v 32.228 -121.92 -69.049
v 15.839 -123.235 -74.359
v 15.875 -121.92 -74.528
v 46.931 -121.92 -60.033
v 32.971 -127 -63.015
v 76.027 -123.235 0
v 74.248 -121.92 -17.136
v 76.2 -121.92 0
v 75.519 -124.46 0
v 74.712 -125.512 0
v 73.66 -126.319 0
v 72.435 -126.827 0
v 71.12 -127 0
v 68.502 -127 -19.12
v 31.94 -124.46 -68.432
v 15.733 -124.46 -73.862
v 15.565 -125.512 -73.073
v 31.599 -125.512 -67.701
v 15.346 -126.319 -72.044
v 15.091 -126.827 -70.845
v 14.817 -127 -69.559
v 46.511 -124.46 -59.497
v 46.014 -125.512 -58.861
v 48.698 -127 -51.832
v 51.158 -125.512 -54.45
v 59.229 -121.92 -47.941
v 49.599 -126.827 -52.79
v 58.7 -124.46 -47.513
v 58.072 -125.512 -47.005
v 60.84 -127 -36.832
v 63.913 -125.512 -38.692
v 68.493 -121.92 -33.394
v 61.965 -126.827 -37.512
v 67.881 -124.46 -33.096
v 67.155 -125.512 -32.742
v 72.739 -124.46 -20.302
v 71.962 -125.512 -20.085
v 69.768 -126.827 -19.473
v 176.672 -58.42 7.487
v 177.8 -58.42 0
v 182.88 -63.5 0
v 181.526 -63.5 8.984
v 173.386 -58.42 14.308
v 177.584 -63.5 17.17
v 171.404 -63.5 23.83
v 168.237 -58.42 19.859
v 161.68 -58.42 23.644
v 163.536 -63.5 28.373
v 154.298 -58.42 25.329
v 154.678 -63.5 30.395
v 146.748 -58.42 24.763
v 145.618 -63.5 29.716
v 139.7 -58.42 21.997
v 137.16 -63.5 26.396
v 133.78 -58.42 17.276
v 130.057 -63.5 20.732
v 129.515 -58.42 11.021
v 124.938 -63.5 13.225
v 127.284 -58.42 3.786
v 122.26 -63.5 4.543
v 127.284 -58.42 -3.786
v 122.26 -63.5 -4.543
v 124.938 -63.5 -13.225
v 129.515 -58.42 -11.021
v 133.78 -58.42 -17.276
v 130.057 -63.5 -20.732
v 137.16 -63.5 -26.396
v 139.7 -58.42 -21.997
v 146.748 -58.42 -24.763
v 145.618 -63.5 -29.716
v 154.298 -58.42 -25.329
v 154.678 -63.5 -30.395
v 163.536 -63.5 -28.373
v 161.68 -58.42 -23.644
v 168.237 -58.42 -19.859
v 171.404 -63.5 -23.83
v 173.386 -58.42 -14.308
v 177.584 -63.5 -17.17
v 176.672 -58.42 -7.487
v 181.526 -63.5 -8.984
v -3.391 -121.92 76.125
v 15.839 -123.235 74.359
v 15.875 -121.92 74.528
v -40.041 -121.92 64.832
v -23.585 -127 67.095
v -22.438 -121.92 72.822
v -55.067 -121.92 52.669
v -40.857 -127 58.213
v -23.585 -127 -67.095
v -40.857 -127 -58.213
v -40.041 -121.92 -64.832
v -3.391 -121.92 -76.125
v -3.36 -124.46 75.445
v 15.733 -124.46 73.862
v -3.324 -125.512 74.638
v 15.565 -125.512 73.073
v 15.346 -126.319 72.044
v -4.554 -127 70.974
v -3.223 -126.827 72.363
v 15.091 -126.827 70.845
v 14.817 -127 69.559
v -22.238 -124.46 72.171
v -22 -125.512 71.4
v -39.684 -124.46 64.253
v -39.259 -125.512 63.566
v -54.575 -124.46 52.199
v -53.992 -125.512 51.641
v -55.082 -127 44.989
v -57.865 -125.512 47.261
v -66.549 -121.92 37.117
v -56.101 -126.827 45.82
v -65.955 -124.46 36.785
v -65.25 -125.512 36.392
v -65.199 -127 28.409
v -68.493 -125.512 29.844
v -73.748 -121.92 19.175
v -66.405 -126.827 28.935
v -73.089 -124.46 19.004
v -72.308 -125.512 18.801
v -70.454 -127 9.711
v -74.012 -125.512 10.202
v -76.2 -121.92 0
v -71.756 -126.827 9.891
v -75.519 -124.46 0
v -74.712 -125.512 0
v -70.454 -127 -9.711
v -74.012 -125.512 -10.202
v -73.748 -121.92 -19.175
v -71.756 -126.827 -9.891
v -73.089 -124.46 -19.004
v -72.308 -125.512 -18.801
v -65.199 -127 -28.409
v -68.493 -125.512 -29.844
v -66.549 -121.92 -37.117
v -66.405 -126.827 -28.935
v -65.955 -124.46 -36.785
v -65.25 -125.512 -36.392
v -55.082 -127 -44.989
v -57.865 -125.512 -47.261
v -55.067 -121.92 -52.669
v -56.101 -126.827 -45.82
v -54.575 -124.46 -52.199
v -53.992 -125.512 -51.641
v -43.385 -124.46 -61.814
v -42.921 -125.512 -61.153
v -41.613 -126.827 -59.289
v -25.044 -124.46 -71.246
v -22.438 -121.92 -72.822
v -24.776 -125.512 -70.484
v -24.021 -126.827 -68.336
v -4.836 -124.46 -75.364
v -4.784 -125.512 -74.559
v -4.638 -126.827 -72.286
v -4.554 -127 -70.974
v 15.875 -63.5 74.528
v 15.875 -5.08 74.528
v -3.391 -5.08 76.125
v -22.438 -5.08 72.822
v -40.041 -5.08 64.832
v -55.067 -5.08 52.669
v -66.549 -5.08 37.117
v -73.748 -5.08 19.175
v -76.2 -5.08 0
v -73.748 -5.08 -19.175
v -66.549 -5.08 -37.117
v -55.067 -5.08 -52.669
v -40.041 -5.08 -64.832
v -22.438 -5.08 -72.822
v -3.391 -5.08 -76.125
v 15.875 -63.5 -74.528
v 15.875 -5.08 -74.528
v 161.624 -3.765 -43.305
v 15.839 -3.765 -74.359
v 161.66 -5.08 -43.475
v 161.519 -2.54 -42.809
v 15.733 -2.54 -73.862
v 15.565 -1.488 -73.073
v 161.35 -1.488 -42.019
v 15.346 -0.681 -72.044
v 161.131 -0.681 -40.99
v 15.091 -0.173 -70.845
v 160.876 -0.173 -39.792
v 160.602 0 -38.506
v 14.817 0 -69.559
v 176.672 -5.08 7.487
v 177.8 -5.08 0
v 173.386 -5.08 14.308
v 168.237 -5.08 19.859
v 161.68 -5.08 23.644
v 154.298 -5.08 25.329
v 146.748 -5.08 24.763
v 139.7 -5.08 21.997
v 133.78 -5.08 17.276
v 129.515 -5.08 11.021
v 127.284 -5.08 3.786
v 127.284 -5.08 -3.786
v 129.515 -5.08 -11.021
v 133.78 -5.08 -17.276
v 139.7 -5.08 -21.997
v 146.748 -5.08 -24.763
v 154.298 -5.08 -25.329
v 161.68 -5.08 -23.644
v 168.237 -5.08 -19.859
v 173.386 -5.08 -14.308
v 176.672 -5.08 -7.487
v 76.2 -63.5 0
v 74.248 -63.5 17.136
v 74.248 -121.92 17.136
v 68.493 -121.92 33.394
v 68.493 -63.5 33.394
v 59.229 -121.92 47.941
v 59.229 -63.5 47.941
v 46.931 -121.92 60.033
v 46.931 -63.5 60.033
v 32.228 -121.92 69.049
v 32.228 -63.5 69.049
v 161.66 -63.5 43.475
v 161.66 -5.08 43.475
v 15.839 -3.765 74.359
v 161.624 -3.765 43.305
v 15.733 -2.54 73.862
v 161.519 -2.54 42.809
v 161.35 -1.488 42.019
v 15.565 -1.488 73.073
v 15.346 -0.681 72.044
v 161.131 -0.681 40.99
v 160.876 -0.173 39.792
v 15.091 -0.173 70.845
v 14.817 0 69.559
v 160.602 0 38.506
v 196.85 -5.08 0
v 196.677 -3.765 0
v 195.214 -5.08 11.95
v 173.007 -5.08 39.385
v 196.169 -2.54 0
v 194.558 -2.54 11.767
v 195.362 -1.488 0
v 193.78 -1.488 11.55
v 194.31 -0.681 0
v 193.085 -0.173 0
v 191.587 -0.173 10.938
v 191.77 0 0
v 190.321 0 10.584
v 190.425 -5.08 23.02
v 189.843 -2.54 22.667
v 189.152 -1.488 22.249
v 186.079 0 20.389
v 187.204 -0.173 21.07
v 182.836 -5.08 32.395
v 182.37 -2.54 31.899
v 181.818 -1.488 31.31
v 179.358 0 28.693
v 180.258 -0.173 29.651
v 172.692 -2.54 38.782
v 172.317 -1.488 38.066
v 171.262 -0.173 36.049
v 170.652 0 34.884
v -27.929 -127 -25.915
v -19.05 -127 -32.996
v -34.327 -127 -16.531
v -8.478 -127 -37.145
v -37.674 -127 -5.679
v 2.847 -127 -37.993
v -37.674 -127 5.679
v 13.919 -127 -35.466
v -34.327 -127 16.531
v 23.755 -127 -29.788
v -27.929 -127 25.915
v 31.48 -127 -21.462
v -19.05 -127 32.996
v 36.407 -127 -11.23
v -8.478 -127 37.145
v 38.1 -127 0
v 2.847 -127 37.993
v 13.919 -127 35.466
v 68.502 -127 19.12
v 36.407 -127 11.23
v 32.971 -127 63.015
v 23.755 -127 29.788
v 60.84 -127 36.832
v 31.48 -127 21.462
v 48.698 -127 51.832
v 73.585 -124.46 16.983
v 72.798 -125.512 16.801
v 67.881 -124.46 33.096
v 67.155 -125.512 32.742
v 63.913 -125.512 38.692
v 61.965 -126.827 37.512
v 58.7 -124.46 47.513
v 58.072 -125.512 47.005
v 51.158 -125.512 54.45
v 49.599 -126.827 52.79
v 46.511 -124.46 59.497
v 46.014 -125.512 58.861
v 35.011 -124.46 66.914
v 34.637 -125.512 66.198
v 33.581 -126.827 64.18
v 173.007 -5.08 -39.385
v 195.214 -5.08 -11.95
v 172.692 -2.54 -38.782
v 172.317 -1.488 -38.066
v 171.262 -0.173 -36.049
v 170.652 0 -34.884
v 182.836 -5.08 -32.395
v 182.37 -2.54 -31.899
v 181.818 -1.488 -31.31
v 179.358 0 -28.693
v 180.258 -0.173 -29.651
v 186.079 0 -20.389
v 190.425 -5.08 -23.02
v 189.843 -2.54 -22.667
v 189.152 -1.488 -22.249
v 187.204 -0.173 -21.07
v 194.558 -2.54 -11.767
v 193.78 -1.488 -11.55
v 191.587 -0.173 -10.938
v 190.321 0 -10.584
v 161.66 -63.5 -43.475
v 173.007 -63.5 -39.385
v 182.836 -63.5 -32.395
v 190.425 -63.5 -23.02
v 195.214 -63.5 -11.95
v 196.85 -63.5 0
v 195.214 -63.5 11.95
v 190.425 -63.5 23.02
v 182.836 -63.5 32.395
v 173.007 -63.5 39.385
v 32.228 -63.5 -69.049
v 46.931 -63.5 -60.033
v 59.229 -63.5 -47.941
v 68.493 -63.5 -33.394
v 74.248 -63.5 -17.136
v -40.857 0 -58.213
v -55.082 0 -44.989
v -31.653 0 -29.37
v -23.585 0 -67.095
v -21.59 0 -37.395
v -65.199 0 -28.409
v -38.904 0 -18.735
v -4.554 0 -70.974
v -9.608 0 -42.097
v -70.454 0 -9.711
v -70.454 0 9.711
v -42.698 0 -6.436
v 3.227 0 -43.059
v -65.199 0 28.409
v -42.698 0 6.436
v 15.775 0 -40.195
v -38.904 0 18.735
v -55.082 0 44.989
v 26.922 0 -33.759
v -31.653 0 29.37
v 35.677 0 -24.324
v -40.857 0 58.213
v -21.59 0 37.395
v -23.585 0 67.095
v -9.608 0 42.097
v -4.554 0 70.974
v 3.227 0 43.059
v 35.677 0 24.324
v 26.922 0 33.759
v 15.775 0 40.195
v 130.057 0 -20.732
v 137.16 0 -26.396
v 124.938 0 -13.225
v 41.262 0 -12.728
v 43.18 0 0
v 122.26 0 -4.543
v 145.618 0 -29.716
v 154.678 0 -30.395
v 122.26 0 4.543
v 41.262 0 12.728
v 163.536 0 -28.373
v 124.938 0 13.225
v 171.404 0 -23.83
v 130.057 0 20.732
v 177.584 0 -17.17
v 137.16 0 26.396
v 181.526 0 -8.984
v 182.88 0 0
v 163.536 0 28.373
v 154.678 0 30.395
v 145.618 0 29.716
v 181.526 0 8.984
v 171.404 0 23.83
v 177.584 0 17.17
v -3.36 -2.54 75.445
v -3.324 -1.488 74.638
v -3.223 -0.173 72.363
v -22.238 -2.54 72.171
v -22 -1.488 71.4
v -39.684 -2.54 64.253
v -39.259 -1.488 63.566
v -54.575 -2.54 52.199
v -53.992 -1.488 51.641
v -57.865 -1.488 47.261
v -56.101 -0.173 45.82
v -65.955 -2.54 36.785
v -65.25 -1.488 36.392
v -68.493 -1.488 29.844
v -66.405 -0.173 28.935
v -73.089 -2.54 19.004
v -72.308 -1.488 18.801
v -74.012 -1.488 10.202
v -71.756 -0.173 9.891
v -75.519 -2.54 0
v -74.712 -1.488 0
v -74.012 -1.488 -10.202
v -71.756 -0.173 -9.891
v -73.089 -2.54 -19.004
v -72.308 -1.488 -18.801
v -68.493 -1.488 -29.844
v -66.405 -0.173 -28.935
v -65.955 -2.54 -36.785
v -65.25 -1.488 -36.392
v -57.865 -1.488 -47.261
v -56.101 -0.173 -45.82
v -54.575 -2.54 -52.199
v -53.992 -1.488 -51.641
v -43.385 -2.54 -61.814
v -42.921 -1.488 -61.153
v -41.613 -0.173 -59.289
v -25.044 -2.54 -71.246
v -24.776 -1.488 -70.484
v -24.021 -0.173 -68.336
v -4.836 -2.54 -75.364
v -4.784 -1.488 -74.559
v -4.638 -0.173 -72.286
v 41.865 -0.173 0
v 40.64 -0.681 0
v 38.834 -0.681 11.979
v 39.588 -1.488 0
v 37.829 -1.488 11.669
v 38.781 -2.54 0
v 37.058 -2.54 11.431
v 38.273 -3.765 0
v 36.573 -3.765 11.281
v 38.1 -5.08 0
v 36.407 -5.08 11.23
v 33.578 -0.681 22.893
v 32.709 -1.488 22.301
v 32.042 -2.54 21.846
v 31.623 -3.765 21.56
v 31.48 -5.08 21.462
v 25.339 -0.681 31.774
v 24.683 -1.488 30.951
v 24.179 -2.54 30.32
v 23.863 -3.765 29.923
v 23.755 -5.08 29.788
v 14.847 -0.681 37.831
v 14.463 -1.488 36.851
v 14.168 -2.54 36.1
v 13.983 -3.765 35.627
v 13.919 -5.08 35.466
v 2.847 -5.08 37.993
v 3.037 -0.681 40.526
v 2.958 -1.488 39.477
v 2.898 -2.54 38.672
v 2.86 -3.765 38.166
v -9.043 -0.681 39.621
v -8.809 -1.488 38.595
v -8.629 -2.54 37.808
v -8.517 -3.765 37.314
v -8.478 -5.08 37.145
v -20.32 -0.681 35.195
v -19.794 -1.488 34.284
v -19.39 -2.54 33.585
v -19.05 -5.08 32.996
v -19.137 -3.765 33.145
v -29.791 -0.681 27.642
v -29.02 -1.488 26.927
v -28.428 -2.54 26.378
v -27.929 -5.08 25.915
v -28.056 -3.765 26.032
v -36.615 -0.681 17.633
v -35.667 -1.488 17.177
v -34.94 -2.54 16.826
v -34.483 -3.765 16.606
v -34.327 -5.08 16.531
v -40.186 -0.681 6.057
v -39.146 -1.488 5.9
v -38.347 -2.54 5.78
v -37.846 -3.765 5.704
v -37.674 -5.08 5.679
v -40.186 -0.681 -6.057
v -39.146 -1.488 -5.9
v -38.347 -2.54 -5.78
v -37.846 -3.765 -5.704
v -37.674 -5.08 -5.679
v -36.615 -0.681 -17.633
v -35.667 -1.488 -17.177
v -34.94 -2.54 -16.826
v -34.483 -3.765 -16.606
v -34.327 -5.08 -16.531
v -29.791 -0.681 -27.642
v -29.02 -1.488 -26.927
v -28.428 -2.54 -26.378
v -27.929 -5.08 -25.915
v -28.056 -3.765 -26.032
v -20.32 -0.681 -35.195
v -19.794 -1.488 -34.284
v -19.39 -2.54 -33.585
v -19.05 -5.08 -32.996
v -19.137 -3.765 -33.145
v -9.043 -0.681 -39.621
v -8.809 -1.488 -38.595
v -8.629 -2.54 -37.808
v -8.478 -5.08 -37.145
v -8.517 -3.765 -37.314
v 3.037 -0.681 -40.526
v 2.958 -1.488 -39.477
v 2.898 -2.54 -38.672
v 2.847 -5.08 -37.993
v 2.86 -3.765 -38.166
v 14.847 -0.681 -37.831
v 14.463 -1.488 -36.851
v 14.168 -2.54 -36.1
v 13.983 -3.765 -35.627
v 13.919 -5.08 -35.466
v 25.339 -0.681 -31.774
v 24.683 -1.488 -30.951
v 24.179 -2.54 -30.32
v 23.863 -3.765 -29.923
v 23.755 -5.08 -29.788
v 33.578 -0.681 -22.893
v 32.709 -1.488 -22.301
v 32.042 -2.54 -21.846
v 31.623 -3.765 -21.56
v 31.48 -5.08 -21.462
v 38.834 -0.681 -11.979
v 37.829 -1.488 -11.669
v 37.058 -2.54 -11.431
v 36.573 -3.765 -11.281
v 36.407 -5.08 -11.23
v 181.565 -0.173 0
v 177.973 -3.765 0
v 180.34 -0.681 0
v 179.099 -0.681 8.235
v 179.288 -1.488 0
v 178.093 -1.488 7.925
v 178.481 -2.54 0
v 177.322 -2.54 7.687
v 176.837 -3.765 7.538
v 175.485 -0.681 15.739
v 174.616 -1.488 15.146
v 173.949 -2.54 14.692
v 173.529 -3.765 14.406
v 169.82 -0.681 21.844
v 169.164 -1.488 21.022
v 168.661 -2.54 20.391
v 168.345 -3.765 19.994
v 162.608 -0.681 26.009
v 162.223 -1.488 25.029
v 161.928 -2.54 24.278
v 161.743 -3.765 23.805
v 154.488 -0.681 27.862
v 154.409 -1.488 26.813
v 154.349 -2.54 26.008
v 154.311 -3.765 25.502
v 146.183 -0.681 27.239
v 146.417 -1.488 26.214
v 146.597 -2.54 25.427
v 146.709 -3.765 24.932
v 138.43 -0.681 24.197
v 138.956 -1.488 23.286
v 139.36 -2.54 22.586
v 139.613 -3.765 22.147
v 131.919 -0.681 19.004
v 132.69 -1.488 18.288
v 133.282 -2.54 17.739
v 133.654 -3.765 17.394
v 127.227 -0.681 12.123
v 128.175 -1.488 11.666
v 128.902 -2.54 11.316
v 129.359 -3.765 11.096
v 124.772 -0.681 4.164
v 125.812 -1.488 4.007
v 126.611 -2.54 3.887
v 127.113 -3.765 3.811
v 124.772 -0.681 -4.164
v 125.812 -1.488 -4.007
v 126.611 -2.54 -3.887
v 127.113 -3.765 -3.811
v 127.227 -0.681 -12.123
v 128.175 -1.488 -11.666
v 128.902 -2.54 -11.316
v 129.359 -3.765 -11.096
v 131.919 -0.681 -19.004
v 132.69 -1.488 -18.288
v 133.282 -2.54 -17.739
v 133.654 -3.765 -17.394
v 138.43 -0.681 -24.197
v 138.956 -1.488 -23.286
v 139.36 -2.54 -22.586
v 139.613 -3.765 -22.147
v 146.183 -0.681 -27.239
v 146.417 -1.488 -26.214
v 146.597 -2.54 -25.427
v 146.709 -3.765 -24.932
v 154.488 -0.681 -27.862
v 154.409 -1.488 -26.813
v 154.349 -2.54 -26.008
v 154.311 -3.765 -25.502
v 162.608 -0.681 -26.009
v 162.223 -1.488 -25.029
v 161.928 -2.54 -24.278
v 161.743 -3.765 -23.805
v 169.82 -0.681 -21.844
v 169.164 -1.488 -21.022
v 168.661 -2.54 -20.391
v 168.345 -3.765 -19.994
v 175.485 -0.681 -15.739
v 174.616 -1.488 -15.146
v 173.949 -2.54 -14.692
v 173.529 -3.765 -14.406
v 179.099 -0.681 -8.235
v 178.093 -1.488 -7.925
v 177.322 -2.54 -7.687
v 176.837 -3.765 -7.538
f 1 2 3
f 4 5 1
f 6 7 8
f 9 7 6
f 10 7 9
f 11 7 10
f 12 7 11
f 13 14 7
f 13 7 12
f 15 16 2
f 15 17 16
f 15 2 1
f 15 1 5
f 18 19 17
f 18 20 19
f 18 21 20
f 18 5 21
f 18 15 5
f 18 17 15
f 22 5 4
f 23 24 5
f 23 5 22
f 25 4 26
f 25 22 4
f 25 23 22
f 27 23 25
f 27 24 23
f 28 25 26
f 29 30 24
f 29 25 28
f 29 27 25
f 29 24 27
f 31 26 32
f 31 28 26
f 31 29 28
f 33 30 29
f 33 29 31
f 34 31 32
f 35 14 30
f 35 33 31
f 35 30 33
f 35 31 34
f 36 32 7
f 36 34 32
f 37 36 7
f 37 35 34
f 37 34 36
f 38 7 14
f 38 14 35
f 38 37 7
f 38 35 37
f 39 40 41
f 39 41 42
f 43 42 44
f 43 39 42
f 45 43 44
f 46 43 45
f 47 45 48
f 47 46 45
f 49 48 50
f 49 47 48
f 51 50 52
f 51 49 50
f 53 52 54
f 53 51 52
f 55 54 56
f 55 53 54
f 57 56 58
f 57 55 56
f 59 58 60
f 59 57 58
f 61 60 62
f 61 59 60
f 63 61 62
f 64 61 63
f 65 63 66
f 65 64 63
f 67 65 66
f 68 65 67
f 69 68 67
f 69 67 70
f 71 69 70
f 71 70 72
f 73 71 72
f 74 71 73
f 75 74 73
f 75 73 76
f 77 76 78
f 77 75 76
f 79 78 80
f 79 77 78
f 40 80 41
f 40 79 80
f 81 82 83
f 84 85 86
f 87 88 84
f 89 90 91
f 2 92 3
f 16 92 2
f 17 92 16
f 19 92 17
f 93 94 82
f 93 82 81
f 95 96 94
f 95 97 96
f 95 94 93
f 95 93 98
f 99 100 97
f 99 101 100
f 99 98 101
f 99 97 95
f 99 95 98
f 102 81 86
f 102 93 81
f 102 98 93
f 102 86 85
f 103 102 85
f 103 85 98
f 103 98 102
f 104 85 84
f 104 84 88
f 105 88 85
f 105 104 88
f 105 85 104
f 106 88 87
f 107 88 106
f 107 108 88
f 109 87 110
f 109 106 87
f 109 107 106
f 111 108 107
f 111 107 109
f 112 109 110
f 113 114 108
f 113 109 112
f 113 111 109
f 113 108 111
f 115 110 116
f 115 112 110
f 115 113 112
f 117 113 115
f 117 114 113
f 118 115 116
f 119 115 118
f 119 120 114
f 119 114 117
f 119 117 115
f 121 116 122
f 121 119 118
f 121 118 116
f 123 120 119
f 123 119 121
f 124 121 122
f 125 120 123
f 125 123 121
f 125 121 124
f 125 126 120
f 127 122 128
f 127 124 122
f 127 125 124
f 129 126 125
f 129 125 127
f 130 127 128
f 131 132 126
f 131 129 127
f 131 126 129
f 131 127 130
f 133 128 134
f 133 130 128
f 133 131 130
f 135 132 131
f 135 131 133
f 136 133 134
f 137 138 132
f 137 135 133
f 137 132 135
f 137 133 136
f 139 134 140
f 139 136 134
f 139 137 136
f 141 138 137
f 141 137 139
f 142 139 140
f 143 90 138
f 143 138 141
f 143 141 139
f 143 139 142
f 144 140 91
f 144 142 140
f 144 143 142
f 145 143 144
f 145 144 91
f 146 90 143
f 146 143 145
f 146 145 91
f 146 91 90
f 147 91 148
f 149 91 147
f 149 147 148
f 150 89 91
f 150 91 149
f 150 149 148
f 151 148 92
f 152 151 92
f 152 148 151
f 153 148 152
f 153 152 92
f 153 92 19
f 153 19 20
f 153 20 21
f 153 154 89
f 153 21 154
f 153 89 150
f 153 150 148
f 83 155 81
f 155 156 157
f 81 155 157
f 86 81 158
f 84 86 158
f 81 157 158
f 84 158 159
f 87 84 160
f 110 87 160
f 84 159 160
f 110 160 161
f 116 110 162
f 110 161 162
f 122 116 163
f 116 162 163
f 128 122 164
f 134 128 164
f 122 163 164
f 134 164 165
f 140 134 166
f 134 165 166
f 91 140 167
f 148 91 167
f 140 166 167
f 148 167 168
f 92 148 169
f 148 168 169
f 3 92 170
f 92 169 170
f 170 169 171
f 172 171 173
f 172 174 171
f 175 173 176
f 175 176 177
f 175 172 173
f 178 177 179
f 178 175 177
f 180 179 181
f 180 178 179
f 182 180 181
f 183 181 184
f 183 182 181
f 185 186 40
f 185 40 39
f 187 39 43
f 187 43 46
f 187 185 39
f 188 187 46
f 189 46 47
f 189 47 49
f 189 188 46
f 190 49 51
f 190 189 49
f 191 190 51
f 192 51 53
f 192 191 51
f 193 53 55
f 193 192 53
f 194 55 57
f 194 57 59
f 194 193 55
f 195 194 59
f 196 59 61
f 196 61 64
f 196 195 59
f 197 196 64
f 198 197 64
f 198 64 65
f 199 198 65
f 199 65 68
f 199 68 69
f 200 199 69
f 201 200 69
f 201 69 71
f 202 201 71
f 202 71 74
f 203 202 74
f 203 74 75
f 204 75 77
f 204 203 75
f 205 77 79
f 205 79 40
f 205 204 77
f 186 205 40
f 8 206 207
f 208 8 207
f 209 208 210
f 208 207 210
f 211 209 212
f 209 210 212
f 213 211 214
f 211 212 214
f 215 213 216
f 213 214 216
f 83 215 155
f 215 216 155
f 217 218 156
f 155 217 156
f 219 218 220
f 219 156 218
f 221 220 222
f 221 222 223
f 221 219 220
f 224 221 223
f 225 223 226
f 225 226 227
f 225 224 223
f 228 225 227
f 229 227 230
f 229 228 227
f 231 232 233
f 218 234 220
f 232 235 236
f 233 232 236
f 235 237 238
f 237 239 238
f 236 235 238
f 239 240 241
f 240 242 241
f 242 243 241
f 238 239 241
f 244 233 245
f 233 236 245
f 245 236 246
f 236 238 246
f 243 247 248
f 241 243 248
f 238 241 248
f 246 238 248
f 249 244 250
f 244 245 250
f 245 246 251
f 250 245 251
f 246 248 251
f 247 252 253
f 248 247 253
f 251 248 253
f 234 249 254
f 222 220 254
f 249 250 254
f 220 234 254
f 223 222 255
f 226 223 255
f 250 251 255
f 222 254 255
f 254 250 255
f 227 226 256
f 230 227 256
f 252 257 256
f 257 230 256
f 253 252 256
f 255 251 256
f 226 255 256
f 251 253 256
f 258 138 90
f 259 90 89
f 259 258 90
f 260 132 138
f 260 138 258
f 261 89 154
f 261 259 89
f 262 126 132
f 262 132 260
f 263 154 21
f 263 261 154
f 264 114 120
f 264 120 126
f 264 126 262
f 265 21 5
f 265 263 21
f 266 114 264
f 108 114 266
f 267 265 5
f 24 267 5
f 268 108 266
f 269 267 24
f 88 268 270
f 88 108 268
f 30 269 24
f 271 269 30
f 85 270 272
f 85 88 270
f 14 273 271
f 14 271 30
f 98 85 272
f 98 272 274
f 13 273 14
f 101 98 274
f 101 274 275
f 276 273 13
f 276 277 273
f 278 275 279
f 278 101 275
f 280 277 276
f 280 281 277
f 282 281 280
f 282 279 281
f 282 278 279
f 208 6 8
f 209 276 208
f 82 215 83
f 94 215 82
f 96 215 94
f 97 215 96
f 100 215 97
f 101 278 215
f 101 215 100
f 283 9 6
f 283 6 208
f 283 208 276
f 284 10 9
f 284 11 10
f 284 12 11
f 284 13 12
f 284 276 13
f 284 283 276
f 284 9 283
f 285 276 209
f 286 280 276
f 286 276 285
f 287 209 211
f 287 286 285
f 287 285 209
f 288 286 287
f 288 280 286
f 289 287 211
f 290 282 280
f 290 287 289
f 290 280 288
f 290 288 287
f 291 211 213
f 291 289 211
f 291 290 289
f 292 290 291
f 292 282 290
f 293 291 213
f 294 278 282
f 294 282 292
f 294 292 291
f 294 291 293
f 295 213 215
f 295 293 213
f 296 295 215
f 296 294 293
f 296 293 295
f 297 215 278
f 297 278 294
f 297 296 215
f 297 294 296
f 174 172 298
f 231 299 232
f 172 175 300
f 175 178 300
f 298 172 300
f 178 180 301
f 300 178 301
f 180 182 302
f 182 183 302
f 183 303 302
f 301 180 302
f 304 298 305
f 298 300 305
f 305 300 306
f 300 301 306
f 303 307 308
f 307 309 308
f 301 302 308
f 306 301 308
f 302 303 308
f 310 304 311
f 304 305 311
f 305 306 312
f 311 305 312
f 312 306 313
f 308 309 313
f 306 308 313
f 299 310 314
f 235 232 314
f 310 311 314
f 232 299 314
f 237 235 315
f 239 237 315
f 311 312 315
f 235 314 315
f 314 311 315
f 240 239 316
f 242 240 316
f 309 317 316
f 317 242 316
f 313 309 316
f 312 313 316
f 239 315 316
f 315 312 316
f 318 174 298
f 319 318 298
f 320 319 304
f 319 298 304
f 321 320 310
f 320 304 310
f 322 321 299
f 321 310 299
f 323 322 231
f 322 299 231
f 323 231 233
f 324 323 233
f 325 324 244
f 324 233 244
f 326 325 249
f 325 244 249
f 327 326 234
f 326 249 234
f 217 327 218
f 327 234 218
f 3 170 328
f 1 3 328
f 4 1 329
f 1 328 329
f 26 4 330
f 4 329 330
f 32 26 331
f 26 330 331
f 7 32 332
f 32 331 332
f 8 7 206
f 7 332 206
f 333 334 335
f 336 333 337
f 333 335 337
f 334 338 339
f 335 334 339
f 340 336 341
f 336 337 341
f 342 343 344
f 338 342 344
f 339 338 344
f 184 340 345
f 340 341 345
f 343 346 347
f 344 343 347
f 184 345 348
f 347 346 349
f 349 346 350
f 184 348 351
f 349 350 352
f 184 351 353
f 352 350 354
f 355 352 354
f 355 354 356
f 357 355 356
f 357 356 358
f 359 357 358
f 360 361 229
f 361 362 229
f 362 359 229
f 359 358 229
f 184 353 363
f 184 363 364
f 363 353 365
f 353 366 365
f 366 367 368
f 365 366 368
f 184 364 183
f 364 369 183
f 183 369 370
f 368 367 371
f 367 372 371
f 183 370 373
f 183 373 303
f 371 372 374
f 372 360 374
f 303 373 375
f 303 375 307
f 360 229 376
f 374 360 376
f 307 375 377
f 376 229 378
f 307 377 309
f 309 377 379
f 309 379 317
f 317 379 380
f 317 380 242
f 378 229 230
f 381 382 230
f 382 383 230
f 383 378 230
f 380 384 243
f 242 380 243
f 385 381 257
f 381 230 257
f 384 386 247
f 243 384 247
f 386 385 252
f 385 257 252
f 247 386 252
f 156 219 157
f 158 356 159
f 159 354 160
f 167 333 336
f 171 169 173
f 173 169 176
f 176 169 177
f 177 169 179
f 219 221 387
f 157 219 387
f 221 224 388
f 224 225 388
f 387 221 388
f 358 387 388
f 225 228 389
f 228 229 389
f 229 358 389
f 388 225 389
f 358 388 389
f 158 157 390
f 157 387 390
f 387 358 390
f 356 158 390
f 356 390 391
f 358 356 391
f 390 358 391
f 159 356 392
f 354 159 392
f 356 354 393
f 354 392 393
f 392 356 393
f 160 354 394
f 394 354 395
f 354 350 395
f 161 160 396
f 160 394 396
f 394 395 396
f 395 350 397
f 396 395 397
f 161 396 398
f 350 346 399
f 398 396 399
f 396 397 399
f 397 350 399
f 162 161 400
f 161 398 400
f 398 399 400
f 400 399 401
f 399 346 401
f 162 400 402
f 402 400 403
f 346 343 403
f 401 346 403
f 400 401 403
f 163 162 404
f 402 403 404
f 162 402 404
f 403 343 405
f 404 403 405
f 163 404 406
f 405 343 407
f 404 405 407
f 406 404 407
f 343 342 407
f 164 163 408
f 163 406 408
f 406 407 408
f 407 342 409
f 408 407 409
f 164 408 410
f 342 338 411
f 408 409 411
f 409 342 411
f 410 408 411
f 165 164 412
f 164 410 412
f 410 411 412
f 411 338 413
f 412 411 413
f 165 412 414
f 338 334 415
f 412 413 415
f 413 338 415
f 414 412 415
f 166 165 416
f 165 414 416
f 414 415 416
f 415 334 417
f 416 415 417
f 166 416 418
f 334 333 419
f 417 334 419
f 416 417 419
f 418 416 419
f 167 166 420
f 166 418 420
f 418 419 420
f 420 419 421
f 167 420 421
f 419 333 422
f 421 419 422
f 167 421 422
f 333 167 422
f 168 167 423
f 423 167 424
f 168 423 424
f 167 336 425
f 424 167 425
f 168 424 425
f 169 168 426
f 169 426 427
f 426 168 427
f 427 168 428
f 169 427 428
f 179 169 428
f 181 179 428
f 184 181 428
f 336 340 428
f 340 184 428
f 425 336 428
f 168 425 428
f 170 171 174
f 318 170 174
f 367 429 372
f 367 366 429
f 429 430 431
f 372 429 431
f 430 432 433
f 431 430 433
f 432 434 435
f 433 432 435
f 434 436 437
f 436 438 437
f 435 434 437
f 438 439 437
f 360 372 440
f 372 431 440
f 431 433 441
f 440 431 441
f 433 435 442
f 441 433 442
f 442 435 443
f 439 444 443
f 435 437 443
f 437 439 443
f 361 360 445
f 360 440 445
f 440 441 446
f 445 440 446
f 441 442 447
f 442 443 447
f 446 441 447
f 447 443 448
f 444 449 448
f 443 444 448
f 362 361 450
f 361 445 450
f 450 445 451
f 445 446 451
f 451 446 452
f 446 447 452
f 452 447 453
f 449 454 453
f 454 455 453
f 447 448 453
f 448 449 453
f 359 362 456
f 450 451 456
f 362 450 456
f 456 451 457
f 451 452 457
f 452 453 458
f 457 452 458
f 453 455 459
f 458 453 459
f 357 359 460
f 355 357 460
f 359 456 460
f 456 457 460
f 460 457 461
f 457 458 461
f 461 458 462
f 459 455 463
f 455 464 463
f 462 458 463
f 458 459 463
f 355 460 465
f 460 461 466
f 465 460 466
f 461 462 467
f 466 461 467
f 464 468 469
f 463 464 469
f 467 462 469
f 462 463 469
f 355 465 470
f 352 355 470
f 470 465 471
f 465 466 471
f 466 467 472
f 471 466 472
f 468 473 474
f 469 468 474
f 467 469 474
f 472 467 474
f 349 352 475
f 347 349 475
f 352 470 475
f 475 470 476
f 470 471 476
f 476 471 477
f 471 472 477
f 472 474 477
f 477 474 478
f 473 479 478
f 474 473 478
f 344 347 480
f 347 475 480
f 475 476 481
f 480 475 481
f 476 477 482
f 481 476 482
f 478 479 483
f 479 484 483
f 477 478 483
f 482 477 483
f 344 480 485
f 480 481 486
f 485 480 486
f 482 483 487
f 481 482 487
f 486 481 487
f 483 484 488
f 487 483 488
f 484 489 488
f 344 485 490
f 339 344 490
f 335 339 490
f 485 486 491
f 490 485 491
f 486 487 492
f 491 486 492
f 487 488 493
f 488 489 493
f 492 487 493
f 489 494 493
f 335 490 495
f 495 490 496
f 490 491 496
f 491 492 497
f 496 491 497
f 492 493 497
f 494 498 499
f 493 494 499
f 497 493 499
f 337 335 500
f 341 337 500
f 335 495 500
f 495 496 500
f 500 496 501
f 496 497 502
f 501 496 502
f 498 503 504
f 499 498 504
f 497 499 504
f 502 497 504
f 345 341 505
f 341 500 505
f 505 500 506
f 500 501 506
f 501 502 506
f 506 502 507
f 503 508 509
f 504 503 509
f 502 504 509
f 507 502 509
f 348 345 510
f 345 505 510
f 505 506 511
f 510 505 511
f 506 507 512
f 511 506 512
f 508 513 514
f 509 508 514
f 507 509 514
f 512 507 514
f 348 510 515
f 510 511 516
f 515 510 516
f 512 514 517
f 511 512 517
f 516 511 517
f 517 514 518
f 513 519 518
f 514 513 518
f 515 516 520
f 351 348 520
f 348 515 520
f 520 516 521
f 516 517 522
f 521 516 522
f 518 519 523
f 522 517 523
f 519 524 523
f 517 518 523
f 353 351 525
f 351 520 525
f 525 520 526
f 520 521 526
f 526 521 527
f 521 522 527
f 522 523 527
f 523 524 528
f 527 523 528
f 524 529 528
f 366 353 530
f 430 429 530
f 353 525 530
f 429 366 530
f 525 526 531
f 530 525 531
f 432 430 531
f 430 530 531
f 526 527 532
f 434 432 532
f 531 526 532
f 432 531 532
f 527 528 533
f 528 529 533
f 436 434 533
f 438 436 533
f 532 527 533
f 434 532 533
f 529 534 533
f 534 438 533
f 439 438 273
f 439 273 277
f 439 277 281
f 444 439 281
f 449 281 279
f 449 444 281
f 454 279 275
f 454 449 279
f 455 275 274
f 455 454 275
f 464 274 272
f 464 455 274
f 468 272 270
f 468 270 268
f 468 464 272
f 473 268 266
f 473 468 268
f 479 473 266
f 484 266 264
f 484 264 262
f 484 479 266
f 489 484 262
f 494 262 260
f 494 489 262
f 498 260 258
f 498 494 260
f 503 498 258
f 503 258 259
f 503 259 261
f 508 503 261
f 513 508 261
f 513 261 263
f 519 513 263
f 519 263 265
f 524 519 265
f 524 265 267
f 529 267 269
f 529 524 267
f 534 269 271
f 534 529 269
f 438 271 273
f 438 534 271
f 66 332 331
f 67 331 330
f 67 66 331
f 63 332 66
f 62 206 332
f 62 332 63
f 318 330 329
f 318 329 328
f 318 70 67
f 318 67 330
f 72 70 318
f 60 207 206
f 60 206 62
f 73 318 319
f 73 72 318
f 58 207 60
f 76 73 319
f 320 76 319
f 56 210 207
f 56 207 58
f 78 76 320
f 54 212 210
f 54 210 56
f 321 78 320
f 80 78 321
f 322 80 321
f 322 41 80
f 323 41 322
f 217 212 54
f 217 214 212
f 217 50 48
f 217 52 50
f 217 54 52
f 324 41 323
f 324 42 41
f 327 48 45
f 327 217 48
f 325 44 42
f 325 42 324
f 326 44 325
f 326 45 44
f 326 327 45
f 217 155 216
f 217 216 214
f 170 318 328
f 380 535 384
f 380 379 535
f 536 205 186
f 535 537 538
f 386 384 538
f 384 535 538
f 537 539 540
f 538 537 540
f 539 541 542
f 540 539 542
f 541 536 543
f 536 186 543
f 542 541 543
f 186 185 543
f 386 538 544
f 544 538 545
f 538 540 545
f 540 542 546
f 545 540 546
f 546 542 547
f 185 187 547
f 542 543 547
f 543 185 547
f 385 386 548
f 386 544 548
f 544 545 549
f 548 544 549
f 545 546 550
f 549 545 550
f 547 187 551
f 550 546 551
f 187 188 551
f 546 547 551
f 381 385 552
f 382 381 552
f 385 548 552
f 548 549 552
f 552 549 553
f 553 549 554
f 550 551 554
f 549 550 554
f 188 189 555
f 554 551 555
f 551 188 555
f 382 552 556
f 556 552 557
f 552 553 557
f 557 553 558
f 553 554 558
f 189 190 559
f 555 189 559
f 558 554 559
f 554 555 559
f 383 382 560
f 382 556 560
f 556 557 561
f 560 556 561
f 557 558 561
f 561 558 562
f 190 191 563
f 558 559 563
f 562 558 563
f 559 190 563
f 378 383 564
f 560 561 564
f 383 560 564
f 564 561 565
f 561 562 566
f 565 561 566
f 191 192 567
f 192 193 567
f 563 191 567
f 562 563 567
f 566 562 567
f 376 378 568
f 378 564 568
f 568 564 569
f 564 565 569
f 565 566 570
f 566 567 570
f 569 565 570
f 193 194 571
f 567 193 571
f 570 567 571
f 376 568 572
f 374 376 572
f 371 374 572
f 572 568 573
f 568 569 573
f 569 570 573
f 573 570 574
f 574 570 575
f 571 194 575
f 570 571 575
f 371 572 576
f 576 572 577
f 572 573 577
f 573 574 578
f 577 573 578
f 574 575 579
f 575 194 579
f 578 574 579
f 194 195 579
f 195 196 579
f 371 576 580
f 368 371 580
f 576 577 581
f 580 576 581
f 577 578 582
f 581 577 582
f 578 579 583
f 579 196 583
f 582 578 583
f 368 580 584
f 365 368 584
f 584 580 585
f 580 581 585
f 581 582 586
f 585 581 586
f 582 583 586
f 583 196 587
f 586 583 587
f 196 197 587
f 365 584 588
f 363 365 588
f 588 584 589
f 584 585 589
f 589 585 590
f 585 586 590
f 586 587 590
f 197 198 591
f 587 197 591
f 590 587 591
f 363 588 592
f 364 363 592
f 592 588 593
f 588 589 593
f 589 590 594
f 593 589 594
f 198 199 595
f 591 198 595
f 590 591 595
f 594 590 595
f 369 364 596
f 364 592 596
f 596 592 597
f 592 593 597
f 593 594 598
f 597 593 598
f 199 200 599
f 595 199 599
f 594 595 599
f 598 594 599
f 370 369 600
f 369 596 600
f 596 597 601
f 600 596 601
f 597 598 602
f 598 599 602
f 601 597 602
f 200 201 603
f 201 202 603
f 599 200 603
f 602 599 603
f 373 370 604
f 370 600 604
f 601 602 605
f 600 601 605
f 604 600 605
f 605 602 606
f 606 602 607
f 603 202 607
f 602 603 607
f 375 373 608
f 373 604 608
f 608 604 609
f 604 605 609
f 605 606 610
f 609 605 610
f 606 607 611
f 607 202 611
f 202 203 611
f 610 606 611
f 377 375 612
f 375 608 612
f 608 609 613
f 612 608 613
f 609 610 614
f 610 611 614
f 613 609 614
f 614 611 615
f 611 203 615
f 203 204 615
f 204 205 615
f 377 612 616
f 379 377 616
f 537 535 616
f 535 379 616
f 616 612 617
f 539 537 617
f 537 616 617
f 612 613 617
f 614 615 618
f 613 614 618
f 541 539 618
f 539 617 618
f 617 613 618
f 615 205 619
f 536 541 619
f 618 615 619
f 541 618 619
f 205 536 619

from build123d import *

# Parameters (mm, degrees)
F0_R     = 38.1
F0_R_2   = 25.4
F1_DEPTH = 63.5
F2_DEPTH = 127
F3_R     = 5.08
F4_SIZE  = 5.08


with BuildPart() as f1:
    # F0 (on Front) → F1 (new body)
    with BuildSketch(Plane.XZ):
        with BuildLine():
            ThreePointArc((15.875, -74.528011), (59.228857, -47.941449), (76.2, 0))
            ThreePointArc((76.2, 0), (59.228857, 47.941449), (15.875, 74.528011))
            ThreePointArc((15.875, 74.528011), (-76.2, 0), (15.875, -74.528011))
        make_face()
        Circle(F0_R, mode=Mode.SUBTRACT)
        with BuildLine():
            ThreePointArc((15.875, 74.528011), (59.228857, 47.941449), (76.2, 0))
            ThreePointArc((76.2, 0), (59.228857, -47.941449), (15.875, -74.528011))
            Line((15.875, -74.528011), (161.660417, -43.474673))
            ThreePointArc((161.660417, -43.474673), (107.95, 0), (161.660417, 43.474673))
            Line((161.660417, 43.474673), (15.875, 74.528011))
        make_face()
        with BuildLine():
            ThreePointArc((196.85, 0), (186.950167, 27.965845), (161.660417, 43.474673))
            ThreePointArc((161.660417, 43.474673), (107.95, 0), (161.660417, -43.474673))
            ThreePointArc((161.660417, -43.474673), (186.950167, -27.965845), (196.85, 0))
        make_face()
        with Locations((152.4, 0)):
            Circle(F0_R_2, mode=Mode.SUBTRACT)
    extrude(amount=F1_DEPTH)

    # F0 (on Front) → F2 (join)
    with BuildSketch(Plane.XZ):
        with BuildLine():
            ThreePointArc((15.875, -74.528011), (59.228857, -47.941449), (76.2, 0))
            ThreePointArc((76.2, 0), (59.228857, 47.941449), (15.875, 74.528011))
            ThreePointArc((15.875, 74.528011), (-76.2, 0), (15.875, -74.528011))
        make_face()
        Circle(F0_R, mode=Mode.SUBTRACT)
    extrude(amount=F2_DEPTH)

    # F3
    f3_edges = [f1.edges().sort_by_distance(p)[0] for p in [
        (-15.875, -127, 74.528011),
        (-76.2, 0, 0),
        (88.767708, 0, -59.001342),
        (196.85, 0, 0),
        (88.767708, 0, 59.001342),
        (-38.1, 0, 0),
        (127, 0, 0),
    ]]
    fillet(f3_edges, radius=F3_R)

    # F4
    f4_edges = [f1.edges().sort_by_distance(p)[0] for p in [
        (127, -63.5, 0),
    ]]
    chamfer(f4_edges, length=F4_SIZE)


solid = f1.part
